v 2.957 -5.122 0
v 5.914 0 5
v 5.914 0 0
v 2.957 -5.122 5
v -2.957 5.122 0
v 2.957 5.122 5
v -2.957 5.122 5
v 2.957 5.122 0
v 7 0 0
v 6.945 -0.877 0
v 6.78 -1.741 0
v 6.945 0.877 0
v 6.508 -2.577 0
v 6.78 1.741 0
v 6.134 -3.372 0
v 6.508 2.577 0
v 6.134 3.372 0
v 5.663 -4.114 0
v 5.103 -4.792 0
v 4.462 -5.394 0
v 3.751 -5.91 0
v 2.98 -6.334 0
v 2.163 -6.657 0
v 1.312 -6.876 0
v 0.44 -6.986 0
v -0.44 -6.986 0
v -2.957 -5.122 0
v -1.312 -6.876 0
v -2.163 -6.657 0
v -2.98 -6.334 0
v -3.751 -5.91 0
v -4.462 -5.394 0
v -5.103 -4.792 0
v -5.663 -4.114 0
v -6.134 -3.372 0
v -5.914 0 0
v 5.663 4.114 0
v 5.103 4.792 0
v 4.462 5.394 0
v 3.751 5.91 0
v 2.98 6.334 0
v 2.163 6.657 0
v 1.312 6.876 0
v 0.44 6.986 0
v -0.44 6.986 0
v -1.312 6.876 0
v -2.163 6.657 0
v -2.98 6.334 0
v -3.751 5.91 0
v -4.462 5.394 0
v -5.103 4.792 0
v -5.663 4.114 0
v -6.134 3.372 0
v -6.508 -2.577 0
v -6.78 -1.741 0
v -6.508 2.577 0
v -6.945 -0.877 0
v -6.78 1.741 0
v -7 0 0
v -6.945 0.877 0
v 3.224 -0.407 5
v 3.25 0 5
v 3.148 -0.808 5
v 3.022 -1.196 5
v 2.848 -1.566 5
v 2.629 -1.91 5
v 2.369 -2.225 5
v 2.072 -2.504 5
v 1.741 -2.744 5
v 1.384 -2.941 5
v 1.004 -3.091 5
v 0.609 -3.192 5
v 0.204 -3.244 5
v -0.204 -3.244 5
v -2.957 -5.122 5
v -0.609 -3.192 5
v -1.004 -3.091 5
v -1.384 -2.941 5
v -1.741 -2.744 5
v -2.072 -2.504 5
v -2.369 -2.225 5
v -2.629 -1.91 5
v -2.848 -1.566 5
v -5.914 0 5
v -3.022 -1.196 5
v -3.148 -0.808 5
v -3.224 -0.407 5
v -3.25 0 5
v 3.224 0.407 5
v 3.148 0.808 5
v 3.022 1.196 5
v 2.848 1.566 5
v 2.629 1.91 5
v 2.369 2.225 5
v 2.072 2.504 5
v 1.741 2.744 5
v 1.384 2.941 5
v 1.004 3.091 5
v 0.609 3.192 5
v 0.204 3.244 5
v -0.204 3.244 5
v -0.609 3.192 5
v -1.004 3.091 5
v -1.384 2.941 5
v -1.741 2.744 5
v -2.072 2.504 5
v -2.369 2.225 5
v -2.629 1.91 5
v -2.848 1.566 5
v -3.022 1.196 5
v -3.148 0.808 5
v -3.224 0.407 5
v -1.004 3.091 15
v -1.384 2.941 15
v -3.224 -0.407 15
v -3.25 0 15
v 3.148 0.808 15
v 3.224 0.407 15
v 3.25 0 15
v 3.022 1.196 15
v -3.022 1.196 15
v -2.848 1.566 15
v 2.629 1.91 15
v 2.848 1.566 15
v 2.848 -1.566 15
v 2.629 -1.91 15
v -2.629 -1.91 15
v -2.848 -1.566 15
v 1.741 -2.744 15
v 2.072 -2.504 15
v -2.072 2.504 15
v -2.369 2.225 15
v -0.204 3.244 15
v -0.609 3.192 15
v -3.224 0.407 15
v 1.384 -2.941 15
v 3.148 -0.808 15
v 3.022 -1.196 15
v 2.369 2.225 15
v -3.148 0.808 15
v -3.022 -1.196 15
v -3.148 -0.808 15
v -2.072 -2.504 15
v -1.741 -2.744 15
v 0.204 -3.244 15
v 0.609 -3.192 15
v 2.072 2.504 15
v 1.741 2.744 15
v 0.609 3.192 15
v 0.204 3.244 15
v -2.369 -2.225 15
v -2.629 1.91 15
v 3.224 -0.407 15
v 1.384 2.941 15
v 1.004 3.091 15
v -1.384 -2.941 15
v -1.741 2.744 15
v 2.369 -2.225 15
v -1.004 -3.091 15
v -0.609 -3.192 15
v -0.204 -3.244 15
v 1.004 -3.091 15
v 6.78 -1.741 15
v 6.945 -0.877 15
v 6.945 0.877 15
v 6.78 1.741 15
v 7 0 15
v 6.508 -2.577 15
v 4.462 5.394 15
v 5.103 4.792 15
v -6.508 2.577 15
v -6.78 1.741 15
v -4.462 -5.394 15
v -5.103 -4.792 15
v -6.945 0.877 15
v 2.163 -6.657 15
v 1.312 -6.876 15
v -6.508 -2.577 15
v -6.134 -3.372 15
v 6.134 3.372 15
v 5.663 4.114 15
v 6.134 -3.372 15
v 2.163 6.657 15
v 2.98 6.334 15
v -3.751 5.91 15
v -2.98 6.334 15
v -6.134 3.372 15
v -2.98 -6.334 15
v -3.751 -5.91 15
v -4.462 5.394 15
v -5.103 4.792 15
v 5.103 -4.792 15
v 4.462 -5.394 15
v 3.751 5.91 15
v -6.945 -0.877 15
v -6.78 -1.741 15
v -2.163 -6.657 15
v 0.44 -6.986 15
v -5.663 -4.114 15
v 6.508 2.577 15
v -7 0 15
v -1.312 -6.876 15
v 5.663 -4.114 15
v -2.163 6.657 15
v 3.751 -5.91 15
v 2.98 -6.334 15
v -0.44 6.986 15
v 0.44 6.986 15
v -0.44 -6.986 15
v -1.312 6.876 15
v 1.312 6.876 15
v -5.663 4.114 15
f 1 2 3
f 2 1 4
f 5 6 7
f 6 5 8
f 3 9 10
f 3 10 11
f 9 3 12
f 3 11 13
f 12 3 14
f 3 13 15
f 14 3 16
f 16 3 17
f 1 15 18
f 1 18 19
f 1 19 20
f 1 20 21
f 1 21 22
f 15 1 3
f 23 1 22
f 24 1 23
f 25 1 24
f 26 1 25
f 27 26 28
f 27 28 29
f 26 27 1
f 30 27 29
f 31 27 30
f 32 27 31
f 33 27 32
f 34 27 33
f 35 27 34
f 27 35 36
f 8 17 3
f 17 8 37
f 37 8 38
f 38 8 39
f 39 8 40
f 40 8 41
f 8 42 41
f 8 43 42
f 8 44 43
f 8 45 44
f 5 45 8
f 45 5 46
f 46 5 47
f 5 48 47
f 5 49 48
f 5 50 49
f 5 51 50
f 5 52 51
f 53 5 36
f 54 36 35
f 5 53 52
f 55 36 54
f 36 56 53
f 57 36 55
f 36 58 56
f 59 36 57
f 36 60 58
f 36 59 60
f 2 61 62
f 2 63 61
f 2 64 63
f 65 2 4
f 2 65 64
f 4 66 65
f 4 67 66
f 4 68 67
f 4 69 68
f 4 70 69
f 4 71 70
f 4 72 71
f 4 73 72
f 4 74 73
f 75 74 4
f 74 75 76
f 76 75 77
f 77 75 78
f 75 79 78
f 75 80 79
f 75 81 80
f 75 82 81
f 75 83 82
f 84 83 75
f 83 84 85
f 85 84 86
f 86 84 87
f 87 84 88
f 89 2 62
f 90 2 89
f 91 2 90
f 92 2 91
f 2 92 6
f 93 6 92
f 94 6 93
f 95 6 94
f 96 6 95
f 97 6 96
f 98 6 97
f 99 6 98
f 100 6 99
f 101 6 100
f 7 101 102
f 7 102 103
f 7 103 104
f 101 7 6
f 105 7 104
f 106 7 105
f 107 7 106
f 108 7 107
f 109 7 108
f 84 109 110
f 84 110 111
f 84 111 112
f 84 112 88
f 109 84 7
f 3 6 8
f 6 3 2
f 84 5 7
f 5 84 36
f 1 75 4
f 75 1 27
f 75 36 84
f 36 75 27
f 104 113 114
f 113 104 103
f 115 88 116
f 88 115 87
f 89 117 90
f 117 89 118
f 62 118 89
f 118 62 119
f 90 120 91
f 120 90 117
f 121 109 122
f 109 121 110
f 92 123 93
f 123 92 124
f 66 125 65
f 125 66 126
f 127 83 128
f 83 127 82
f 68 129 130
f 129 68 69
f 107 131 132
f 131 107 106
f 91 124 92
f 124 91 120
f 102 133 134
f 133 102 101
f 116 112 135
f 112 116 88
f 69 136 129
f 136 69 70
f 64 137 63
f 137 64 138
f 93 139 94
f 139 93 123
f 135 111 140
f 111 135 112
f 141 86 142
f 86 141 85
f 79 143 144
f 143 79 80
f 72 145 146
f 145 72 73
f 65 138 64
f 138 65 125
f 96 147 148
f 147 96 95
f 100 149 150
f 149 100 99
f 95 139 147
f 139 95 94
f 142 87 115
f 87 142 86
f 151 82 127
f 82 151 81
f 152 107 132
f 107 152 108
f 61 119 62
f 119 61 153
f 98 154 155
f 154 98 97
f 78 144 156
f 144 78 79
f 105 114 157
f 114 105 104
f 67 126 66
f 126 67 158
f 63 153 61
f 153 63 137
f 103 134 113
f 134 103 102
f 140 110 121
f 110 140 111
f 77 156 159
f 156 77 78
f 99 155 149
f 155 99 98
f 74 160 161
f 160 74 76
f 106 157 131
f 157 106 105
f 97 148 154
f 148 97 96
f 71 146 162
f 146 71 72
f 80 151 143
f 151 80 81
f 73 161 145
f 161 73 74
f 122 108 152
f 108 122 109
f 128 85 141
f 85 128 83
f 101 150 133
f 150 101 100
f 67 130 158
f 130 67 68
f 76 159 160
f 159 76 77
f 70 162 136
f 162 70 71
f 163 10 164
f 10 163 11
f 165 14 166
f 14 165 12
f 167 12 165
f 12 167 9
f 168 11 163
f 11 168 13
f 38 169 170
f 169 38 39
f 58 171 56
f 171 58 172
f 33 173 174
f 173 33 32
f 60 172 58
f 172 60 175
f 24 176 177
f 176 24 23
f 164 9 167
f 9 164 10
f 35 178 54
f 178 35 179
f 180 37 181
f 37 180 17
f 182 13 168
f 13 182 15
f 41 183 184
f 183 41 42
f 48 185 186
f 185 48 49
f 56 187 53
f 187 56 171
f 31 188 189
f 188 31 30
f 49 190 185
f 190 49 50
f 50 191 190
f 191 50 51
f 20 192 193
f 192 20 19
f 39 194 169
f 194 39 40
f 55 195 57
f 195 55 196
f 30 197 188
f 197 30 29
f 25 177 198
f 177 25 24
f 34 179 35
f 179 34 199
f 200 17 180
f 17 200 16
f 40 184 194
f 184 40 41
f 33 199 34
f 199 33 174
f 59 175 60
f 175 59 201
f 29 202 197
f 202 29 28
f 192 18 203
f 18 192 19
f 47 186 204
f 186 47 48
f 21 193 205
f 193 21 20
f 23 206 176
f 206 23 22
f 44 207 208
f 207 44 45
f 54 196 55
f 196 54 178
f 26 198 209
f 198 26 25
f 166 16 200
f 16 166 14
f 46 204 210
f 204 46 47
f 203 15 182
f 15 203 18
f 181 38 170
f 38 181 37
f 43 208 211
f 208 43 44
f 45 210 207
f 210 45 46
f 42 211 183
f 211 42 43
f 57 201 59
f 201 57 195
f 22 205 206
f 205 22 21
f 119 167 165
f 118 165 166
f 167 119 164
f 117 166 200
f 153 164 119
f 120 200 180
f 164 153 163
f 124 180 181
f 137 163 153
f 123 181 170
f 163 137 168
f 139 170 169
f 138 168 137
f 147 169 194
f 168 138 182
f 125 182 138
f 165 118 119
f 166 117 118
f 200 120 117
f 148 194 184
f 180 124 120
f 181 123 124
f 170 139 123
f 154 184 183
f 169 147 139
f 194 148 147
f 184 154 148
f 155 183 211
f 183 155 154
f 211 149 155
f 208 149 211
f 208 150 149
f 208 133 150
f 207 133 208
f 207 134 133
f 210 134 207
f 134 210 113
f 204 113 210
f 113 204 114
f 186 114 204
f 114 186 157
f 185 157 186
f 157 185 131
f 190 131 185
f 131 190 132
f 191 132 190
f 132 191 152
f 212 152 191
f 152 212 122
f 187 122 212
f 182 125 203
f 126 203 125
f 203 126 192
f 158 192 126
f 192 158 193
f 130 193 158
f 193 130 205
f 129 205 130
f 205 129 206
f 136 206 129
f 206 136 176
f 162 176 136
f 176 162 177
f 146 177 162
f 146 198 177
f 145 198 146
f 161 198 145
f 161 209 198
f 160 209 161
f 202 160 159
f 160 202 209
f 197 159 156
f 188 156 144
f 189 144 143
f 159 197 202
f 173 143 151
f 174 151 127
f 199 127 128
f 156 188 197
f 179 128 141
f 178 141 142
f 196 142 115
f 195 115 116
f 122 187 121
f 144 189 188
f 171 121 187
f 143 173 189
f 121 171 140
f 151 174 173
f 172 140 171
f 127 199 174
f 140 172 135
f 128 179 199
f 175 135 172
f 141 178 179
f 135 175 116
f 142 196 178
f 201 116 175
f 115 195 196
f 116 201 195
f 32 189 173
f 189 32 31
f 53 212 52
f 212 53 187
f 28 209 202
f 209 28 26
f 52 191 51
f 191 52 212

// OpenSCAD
$fn = 50;


difference() {
	union() {
		cylinder(h = 15, r = 7.0000000000);
	}
	union() {
		translate(v = [0, 0, 0]) {
			rotate(a = [0, 0, 0]) {
				difference() {
					union() {
						#linear_extrude(height = 5) {
							polygon(points = [[5.9142500000, 0.0000000000], [2.9571250000, 5.1218907443], [-2.9571250000, 5.1218907443], [-5.9142500000, 0.0000000000], [-2.9571250000, -5.1218907443], [2.9571250000, -5.1218907443]]);
						}
					}
					union();
				}
			}
		}
		translate(v = [0, 0, -100]) {
			cylinder(h = 200, r = 3.2500000000);
		}
		translate(v = [0, 0, -100]) {
			cylinder(h = 200, r = 1.8000000000);
		}
	}
}
